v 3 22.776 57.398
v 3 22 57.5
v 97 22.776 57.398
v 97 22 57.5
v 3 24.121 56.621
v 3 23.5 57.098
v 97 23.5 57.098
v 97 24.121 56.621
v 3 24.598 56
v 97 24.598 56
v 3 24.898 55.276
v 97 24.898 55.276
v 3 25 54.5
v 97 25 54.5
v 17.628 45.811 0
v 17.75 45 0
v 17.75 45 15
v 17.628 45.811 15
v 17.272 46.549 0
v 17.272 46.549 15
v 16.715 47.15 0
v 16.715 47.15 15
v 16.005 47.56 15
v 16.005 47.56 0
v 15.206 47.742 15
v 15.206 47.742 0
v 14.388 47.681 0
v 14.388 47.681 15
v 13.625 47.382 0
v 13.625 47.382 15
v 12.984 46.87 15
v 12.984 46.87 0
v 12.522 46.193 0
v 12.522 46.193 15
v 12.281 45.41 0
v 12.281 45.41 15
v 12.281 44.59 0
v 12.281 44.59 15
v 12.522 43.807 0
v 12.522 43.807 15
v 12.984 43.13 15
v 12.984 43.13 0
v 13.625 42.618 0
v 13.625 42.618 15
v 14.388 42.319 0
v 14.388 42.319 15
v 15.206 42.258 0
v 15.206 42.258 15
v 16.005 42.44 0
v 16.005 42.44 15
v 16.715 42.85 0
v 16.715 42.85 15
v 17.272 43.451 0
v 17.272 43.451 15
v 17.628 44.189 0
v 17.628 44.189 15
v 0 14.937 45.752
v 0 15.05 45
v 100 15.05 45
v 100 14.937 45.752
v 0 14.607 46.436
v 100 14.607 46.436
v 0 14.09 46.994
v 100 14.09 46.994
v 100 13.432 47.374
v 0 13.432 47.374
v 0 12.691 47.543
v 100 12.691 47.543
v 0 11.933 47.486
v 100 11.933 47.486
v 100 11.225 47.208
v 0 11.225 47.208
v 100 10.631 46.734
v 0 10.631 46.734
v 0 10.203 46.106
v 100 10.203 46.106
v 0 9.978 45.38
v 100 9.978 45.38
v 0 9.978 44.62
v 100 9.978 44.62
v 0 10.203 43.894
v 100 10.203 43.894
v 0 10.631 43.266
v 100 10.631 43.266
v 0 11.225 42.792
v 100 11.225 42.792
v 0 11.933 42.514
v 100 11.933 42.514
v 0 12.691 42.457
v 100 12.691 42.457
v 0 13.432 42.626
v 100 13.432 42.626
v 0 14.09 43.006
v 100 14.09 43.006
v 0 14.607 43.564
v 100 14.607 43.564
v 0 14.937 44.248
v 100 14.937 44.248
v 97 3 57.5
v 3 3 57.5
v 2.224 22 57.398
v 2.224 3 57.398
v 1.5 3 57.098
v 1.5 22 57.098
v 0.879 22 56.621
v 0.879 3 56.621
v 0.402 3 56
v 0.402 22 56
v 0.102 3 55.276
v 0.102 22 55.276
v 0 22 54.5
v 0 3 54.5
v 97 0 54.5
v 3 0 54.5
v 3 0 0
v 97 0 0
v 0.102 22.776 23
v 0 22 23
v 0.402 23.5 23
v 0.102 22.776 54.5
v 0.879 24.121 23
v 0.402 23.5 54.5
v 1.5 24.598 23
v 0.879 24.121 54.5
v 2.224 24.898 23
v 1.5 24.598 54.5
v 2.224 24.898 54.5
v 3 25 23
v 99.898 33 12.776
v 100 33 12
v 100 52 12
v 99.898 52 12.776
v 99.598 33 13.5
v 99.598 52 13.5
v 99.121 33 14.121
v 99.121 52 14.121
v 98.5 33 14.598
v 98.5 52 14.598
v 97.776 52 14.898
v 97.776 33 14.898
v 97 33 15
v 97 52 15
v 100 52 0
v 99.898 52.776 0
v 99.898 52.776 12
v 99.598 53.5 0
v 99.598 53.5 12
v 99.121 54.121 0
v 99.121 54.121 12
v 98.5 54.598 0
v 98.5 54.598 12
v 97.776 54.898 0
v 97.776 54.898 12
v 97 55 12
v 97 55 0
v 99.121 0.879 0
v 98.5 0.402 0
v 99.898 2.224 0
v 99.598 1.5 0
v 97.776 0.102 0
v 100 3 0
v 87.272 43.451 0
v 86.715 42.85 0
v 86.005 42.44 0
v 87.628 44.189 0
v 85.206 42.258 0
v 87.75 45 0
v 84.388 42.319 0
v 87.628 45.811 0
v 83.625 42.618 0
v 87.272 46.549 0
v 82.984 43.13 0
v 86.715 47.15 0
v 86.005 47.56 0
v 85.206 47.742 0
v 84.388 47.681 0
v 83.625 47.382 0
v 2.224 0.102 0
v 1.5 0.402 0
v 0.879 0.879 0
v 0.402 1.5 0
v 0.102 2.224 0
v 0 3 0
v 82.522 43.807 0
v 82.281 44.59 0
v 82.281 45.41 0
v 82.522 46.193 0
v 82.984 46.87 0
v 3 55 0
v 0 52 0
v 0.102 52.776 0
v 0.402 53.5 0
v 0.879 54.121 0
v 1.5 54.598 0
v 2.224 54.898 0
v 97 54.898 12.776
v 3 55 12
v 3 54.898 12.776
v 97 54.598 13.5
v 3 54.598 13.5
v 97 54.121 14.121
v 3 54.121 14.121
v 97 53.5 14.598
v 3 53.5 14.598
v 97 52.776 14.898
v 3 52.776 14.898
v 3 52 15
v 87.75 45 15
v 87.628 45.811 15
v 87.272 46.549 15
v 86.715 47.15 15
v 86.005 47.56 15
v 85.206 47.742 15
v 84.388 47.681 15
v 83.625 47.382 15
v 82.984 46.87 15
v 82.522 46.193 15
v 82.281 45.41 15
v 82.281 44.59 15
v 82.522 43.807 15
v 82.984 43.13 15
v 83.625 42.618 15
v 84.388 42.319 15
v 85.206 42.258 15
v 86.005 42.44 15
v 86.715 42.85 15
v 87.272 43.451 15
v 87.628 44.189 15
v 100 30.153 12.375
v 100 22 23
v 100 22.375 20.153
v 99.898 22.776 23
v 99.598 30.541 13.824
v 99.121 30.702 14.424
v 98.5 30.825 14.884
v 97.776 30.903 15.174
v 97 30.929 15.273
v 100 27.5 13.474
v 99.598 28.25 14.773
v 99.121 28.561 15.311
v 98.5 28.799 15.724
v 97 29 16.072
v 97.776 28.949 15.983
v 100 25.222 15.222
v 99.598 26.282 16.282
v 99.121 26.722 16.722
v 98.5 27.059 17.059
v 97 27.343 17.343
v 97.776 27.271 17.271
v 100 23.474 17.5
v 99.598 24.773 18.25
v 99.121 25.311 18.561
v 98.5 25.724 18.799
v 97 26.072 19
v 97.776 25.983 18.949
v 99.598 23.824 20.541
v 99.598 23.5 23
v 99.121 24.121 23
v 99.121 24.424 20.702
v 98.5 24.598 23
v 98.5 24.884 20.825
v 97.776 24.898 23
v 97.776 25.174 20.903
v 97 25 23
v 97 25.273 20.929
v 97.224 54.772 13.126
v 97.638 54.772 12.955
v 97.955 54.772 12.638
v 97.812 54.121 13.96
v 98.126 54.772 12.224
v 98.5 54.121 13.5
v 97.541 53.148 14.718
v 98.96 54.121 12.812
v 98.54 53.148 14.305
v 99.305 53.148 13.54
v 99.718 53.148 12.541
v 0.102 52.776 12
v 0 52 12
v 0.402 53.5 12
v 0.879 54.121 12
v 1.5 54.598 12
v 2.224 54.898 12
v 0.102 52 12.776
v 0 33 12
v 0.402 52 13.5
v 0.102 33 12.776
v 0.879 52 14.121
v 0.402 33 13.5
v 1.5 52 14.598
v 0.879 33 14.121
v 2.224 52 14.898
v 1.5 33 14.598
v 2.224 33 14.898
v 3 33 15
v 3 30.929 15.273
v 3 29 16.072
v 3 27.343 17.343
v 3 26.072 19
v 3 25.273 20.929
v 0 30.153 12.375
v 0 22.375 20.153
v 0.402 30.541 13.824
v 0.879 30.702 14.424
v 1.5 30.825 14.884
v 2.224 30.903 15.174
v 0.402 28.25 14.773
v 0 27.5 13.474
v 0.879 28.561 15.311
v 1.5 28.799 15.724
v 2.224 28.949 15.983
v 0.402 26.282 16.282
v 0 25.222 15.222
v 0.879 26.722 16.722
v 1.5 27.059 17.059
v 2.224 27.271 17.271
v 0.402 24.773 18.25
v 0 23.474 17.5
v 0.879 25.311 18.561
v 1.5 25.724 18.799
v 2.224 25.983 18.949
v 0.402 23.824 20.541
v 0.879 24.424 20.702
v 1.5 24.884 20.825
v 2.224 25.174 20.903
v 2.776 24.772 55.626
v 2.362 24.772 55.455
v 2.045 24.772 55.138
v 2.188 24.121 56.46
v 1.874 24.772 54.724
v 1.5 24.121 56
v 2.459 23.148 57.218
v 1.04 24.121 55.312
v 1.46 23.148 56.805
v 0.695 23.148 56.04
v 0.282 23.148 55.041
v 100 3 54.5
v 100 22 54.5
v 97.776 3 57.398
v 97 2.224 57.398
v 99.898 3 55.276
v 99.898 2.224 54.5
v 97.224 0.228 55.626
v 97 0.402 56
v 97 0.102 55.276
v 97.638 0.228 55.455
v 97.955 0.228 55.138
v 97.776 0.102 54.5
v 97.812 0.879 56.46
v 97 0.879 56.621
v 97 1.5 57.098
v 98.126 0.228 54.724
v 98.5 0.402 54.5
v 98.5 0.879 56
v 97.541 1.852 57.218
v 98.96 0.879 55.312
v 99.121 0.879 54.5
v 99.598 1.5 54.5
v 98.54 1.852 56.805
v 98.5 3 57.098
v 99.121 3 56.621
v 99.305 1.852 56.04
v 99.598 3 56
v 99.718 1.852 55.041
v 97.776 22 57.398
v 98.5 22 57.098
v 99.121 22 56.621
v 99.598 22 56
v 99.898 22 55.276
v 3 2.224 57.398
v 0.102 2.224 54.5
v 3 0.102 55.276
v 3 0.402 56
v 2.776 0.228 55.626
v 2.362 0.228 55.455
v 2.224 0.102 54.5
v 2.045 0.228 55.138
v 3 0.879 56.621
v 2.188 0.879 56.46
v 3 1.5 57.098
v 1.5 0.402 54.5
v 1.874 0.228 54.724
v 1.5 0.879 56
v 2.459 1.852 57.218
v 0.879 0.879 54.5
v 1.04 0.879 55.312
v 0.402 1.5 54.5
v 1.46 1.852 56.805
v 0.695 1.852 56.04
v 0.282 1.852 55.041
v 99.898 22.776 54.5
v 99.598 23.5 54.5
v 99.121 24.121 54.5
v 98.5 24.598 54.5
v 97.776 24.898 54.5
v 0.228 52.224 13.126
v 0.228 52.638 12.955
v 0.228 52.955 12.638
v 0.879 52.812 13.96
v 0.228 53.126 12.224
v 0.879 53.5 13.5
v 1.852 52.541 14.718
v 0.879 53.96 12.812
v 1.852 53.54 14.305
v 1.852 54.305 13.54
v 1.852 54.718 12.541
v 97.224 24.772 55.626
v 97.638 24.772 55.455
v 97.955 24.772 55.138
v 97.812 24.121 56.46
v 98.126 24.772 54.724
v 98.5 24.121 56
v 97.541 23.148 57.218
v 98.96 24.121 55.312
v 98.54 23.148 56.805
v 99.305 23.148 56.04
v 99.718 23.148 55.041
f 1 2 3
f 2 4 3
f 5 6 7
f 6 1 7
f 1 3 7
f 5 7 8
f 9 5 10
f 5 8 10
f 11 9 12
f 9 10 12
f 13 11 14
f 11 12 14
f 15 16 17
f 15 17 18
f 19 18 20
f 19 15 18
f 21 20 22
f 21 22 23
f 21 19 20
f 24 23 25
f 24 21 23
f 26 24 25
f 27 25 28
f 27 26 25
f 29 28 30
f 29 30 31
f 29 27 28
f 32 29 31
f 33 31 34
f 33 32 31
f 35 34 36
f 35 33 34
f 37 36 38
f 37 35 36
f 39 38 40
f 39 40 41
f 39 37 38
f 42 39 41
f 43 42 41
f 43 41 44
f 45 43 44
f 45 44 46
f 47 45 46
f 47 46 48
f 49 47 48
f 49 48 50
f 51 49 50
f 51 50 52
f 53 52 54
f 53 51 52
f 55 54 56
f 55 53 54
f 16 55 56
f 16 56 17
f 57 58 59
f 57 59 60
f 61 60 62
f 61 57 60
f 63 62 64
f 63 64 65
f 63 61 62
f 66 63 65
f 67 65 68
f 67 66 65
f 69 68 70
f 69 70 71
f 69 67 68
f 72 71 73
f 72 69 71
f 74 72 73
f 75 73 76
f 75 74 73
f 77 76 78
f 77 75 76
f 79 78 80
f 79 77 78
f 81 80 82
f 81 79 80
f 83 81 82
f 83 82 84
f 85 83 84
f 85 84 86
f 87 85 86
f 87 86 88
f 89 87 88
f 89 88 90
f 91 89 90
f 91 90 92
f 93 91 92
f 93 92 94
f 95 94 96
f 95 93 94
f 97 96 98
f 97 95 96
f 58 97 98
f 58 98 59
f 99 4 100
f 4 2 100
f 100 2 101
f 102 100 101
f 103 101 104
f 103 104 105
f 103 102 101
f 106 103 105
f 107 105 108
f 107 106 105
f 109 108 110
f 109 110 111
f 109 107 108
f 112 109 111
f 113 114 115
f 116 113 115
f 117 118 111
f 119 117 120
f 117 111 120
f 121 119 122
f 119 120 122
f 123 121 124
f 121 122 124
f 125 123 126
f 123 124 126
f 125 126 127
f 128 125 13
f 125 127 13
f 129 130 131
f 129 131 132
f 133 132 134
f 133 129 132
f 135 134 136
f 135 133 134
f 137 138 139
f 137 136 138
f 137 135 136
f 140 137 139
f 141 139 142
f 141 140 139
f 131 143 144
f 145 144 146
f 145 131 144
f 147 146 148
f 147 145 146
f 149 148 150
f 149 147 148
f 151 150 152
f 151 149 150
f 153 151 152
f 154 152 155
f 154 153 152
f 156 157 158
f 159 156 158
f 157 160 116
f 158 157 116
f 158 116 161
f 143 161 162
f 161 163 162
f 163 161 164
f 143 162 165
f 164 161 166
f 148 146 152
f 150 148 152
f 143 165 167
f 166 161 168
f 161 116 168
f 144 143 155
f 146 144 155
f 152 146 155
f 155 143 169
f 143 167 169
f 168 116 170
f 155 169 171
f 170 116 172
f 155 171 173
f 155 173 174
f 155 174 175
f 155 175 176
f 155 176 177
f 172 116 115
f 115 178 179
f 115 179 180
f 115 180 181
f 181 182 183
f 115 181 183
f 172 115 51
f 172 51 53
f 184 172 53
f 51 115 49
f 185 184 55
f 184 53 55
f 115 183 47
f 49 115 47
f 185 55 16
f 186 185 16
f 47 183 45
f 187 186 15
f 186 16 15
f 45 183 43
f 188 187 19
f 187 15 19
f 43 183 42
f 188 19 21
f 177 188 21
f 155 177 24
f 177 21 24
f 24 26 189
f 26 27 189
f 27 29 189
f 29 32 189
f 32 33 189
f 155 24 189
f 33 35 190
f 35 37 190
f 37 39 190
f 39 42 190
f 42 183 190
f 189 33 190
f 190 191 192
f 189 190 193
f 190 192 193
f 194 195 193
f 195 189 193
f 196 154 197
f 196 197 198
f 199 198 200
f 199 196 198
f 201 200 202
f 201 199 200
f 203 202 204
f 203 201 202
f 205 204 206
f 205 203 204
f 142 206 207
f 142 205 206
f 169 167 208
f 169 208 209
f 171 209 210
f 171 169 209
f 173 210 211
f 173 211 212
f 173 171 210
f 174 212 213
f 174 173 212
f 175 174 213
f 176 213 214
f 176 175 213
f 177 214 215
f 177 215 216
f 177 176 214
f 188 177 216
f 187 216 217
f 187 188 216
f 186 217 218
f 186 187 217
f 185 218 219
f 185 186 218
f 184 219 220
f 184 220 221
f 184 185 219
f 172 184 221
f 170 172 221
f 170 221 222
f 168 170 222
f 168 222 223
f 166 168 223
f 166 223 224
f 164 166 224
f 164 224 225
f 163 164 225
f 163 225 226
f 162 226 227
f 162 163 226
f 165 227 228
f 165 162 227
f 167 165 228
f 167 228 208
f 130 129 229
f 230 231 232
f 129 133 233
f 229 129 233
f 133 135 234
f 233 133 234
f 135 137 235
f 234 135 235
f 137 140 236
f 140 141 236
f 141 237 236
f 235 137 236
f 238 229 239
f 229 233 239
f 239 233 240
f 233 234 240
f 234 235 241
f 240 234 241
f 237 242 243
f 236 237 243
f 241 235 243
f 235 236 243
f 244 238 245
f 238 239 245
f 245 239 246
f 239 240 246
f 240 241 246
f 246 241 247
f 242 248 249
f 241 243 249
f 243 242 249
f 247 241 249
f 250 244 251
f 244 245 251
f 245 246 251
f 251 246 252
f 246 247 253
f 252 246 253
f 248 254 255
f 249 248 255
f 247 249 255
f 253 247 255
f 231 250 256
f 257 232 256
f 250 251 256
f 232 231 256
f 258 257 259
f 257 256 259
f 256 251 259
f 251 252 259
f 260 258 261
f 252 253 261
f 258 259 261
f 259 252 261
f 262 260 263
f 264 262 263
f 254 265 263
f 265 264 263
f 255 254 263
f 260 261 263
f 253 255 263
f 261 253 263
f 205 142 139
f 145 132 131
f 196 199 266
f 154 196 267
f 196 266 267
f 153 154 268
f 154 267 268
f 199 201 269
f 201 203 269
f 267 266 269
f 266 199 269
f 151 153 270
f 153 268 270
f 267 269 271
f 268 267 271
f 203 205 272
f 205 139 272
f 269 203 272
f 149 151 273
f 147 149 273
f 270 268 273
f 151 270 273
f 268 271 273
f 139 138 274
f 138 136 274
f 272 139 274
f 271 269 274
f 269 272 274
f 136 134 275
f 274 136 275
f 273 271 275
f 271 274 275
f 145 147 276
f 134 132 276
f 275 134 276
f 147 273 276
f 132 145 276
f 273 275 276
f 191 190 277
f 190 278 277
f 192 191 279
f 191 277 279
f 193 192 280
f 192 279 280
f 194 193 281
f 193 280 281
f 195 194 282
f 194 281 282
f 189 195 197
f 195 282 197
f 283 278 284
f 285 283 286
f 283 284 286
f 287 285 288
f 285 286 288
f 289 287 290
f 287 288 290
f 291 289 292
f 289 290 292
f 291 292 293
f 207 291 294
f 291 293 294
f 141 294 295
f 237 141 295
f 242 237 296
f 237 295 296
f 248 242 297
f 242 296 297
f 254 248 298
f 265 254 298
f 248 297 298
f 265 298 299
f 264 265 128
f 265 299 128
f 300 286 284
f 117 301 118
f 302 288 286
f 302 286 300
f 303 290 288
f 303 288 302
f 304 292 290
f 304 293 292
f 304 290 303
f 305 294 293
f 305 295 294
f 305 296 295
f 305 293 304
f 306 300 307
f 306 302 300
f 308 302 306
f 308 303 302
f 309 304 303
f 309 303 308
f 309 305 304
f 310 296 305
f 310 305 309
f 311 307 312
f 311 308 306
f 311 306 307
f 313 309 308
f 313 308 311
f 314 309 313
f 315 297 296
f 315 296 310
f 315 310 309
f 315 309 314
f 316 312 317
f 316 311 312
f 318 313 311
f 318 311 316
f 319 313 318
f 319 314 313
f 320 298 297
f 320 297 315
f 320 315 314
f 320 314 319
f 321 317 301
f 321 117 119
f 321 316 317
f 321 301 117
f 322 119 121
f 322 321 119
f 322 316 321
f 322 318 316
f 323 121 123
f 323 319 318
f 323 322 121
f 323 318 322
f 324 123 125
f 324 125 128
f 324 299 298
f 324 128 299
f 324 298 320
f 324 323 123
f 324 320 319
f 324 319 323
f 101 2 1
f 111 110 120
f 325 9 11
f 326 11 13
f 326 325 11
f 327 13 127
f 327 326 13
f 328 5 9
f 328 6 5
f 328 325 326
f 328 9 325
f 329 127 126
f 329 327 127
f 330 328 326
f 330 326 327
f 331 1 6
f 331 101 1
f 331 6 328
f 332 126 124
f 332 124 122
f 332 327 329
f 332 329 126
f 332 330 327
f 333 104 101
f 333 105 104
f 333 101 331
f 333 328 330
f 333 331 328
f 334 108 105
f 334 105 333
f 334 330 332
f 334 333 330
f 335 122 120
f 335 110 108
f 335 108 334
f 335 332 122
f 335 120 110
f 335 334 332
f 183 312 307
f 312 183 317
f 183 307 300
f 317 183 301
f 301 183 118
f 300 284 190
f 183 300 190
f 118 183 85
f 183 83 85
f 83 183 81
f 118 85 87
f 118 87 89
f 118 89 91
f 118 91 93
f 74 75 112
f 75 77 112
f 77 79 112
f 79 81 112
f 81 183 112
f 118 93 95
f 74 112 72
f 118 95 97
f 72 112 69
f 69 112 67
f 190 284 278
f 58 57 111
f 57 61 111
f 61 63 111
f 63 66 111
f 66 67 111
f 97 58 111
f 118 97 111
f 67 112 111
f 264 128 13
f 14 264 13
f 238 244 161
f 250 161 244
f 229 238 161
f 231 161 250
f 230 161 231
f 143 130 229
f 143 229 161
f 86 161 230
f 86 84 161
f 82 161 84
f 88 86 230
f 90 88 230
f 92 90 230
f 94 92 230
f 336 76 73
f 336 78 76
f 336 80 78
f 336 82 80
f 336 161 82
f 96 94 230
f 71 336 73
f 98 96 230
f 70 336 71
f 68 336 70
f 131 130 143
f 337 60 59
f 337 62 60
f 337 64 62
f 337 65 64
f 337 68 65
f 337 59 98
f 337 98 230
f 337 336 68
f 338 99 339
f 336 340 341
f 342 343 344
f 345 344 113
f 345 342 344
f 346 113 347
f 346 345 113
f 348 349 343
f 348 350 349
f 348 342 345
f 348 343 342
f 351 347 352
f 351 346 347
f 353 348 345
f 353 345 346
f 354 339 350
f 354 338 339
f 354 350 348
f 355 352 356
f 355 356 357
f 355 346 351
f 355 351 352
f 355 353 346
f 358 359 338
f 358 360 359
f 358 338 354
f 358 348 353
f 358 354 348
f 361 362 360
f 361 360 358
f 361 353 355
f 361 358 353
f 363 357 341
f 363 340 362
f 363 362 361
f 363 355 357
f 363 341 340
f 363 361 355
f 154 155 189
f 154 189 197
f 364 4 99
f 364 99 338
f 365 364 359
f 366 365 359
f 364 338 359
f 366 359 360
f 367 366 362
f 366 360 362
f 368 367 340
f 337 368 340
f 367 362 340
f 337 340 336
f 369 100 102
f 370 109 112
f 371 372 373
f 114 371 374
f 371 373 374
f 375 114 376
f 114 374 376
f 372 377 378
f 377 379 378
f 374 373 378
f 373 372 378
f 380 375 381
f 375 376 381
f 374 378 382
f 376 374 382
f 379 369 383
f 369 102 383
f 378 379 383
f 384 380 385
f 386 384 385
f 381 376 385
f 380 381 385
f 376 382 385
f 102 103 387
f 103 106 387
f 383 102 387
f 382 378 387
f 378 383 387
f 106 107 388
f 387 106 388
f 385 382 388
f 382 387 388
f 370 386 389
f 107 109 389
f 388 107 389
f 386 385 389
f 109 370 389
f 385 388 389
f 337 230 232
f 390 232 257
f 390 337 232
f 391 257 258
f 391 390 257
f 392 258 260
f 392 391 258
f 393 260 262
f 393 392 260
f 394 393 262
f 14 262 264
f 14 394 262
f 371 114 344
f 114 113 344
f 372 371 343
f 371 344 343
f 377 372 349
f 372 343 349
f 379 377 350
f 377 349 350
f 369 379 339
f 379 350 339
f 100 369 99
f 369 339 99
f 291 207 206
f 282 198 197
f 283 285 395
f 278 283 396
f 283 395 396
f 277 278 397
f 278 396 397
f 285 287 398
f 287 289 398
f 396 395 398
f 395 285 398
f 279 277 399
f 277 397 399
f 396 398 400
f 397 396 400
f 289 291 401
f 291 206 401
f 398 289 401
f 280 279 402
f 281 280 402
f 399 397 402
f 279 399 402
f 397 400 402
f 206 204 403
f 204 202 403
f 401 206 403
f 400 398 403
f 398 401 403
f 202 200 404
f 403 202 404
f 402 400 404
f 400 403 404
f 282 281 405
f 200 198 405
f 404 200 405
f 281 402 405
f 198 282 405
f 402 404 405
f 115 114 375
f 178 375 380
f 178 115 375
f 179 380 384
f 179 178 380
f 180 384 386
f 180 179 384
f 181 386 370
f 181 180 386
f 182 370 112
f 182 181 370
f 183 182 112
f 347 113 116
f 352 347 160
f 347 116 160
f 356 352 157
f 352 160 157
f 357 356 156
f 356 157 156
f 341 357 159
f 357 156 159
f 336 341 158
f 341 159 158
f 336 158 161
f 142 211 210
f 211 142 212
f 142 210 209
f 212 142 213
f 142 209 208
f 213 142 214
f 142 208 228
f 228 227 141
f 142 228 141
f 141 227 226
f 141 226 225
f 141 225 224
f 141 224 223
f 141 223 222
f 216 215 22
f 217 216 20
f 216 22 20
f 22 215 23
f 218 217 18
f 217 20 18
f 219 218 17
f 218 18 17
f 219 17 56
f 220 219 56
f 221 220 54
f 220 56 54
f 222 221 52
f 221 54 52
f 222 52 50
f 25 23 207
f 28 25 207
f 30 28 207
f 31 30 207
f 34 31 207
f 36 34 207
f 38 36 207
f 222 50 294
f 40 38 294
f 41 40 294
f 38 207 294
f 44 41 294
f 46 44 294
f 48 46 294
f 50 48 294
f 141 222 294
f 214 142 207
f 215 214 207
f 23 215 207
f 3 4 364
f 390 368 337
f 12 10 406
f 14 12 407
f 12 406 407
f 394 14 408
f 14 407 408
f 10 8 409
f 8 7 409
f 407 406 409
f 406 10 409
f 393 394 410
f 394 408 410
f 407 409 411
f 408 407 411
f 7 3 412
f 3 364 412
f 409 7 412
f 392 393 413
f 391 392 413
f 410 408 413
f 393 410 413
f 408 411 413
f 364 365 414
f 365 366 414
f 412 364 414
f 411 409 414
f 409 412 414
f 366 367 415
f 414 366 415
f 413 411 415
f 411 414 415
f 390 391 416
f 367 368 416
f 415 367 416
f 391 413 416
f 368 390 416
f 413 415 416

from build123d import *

# Parameters (mm, degrees)
F0_R     = 2.55
F1_DEPTH = 100
F2_R     = 2.75
F3_DEPTH = 15
F4_R     = 3


with BuildPart() as f1:
    # F0 (on Right) → F1 (new body)
    with BuildSketch(Plane.YZ):
        with BuildLine():
            Line((0, 57.5), (0, 0))
            Line((0, 0), (55, 0))
            Line((55, 0), (55, 15))
            Line((55, 15), (33, 15))
            ThreePointArc((33, 15), (27.343146, 17.343146), (25, 23))
            Line((25, 23), (25, 57.5))
            Line((25, 57.5), (0, 57.5))
        make_face()
        with Locations((12.5, 45)):
            Circle(F0_R, mode=Mode.SUBTRACT)
    extrude(amount=F1_DEPTH)

    # F2 (on Top) → F3 (cut)
    with BuildSketch(Plane.XY):
        with Locations((15, 45)):
            Circle(F2_R)
        with Locations((85, 45)):
            Circle(F2_R)
    extrude(amount=F3_DEPTH, mode=Mode.SUBTRACT)

    # F4
    f4_edges = [f1.edges().sort_by_distance(p)[0] for p in [
        (100, 12.5, 57.5),
        (0, 12.5, 57.5),
        (50, 25, 57.5),
        (50, 0, 57.5),
        (100, 44, 15),
        (50, 55, 15),
        (0, 44, 15),
        (100, 0, 28.75),
        (0, 0, 28.75),
        (0, 55, 7.5),
        (100, 55, 7.5),
    ]]
    fillet(f4_edges, radius=F4_R)


solid = f1.part
